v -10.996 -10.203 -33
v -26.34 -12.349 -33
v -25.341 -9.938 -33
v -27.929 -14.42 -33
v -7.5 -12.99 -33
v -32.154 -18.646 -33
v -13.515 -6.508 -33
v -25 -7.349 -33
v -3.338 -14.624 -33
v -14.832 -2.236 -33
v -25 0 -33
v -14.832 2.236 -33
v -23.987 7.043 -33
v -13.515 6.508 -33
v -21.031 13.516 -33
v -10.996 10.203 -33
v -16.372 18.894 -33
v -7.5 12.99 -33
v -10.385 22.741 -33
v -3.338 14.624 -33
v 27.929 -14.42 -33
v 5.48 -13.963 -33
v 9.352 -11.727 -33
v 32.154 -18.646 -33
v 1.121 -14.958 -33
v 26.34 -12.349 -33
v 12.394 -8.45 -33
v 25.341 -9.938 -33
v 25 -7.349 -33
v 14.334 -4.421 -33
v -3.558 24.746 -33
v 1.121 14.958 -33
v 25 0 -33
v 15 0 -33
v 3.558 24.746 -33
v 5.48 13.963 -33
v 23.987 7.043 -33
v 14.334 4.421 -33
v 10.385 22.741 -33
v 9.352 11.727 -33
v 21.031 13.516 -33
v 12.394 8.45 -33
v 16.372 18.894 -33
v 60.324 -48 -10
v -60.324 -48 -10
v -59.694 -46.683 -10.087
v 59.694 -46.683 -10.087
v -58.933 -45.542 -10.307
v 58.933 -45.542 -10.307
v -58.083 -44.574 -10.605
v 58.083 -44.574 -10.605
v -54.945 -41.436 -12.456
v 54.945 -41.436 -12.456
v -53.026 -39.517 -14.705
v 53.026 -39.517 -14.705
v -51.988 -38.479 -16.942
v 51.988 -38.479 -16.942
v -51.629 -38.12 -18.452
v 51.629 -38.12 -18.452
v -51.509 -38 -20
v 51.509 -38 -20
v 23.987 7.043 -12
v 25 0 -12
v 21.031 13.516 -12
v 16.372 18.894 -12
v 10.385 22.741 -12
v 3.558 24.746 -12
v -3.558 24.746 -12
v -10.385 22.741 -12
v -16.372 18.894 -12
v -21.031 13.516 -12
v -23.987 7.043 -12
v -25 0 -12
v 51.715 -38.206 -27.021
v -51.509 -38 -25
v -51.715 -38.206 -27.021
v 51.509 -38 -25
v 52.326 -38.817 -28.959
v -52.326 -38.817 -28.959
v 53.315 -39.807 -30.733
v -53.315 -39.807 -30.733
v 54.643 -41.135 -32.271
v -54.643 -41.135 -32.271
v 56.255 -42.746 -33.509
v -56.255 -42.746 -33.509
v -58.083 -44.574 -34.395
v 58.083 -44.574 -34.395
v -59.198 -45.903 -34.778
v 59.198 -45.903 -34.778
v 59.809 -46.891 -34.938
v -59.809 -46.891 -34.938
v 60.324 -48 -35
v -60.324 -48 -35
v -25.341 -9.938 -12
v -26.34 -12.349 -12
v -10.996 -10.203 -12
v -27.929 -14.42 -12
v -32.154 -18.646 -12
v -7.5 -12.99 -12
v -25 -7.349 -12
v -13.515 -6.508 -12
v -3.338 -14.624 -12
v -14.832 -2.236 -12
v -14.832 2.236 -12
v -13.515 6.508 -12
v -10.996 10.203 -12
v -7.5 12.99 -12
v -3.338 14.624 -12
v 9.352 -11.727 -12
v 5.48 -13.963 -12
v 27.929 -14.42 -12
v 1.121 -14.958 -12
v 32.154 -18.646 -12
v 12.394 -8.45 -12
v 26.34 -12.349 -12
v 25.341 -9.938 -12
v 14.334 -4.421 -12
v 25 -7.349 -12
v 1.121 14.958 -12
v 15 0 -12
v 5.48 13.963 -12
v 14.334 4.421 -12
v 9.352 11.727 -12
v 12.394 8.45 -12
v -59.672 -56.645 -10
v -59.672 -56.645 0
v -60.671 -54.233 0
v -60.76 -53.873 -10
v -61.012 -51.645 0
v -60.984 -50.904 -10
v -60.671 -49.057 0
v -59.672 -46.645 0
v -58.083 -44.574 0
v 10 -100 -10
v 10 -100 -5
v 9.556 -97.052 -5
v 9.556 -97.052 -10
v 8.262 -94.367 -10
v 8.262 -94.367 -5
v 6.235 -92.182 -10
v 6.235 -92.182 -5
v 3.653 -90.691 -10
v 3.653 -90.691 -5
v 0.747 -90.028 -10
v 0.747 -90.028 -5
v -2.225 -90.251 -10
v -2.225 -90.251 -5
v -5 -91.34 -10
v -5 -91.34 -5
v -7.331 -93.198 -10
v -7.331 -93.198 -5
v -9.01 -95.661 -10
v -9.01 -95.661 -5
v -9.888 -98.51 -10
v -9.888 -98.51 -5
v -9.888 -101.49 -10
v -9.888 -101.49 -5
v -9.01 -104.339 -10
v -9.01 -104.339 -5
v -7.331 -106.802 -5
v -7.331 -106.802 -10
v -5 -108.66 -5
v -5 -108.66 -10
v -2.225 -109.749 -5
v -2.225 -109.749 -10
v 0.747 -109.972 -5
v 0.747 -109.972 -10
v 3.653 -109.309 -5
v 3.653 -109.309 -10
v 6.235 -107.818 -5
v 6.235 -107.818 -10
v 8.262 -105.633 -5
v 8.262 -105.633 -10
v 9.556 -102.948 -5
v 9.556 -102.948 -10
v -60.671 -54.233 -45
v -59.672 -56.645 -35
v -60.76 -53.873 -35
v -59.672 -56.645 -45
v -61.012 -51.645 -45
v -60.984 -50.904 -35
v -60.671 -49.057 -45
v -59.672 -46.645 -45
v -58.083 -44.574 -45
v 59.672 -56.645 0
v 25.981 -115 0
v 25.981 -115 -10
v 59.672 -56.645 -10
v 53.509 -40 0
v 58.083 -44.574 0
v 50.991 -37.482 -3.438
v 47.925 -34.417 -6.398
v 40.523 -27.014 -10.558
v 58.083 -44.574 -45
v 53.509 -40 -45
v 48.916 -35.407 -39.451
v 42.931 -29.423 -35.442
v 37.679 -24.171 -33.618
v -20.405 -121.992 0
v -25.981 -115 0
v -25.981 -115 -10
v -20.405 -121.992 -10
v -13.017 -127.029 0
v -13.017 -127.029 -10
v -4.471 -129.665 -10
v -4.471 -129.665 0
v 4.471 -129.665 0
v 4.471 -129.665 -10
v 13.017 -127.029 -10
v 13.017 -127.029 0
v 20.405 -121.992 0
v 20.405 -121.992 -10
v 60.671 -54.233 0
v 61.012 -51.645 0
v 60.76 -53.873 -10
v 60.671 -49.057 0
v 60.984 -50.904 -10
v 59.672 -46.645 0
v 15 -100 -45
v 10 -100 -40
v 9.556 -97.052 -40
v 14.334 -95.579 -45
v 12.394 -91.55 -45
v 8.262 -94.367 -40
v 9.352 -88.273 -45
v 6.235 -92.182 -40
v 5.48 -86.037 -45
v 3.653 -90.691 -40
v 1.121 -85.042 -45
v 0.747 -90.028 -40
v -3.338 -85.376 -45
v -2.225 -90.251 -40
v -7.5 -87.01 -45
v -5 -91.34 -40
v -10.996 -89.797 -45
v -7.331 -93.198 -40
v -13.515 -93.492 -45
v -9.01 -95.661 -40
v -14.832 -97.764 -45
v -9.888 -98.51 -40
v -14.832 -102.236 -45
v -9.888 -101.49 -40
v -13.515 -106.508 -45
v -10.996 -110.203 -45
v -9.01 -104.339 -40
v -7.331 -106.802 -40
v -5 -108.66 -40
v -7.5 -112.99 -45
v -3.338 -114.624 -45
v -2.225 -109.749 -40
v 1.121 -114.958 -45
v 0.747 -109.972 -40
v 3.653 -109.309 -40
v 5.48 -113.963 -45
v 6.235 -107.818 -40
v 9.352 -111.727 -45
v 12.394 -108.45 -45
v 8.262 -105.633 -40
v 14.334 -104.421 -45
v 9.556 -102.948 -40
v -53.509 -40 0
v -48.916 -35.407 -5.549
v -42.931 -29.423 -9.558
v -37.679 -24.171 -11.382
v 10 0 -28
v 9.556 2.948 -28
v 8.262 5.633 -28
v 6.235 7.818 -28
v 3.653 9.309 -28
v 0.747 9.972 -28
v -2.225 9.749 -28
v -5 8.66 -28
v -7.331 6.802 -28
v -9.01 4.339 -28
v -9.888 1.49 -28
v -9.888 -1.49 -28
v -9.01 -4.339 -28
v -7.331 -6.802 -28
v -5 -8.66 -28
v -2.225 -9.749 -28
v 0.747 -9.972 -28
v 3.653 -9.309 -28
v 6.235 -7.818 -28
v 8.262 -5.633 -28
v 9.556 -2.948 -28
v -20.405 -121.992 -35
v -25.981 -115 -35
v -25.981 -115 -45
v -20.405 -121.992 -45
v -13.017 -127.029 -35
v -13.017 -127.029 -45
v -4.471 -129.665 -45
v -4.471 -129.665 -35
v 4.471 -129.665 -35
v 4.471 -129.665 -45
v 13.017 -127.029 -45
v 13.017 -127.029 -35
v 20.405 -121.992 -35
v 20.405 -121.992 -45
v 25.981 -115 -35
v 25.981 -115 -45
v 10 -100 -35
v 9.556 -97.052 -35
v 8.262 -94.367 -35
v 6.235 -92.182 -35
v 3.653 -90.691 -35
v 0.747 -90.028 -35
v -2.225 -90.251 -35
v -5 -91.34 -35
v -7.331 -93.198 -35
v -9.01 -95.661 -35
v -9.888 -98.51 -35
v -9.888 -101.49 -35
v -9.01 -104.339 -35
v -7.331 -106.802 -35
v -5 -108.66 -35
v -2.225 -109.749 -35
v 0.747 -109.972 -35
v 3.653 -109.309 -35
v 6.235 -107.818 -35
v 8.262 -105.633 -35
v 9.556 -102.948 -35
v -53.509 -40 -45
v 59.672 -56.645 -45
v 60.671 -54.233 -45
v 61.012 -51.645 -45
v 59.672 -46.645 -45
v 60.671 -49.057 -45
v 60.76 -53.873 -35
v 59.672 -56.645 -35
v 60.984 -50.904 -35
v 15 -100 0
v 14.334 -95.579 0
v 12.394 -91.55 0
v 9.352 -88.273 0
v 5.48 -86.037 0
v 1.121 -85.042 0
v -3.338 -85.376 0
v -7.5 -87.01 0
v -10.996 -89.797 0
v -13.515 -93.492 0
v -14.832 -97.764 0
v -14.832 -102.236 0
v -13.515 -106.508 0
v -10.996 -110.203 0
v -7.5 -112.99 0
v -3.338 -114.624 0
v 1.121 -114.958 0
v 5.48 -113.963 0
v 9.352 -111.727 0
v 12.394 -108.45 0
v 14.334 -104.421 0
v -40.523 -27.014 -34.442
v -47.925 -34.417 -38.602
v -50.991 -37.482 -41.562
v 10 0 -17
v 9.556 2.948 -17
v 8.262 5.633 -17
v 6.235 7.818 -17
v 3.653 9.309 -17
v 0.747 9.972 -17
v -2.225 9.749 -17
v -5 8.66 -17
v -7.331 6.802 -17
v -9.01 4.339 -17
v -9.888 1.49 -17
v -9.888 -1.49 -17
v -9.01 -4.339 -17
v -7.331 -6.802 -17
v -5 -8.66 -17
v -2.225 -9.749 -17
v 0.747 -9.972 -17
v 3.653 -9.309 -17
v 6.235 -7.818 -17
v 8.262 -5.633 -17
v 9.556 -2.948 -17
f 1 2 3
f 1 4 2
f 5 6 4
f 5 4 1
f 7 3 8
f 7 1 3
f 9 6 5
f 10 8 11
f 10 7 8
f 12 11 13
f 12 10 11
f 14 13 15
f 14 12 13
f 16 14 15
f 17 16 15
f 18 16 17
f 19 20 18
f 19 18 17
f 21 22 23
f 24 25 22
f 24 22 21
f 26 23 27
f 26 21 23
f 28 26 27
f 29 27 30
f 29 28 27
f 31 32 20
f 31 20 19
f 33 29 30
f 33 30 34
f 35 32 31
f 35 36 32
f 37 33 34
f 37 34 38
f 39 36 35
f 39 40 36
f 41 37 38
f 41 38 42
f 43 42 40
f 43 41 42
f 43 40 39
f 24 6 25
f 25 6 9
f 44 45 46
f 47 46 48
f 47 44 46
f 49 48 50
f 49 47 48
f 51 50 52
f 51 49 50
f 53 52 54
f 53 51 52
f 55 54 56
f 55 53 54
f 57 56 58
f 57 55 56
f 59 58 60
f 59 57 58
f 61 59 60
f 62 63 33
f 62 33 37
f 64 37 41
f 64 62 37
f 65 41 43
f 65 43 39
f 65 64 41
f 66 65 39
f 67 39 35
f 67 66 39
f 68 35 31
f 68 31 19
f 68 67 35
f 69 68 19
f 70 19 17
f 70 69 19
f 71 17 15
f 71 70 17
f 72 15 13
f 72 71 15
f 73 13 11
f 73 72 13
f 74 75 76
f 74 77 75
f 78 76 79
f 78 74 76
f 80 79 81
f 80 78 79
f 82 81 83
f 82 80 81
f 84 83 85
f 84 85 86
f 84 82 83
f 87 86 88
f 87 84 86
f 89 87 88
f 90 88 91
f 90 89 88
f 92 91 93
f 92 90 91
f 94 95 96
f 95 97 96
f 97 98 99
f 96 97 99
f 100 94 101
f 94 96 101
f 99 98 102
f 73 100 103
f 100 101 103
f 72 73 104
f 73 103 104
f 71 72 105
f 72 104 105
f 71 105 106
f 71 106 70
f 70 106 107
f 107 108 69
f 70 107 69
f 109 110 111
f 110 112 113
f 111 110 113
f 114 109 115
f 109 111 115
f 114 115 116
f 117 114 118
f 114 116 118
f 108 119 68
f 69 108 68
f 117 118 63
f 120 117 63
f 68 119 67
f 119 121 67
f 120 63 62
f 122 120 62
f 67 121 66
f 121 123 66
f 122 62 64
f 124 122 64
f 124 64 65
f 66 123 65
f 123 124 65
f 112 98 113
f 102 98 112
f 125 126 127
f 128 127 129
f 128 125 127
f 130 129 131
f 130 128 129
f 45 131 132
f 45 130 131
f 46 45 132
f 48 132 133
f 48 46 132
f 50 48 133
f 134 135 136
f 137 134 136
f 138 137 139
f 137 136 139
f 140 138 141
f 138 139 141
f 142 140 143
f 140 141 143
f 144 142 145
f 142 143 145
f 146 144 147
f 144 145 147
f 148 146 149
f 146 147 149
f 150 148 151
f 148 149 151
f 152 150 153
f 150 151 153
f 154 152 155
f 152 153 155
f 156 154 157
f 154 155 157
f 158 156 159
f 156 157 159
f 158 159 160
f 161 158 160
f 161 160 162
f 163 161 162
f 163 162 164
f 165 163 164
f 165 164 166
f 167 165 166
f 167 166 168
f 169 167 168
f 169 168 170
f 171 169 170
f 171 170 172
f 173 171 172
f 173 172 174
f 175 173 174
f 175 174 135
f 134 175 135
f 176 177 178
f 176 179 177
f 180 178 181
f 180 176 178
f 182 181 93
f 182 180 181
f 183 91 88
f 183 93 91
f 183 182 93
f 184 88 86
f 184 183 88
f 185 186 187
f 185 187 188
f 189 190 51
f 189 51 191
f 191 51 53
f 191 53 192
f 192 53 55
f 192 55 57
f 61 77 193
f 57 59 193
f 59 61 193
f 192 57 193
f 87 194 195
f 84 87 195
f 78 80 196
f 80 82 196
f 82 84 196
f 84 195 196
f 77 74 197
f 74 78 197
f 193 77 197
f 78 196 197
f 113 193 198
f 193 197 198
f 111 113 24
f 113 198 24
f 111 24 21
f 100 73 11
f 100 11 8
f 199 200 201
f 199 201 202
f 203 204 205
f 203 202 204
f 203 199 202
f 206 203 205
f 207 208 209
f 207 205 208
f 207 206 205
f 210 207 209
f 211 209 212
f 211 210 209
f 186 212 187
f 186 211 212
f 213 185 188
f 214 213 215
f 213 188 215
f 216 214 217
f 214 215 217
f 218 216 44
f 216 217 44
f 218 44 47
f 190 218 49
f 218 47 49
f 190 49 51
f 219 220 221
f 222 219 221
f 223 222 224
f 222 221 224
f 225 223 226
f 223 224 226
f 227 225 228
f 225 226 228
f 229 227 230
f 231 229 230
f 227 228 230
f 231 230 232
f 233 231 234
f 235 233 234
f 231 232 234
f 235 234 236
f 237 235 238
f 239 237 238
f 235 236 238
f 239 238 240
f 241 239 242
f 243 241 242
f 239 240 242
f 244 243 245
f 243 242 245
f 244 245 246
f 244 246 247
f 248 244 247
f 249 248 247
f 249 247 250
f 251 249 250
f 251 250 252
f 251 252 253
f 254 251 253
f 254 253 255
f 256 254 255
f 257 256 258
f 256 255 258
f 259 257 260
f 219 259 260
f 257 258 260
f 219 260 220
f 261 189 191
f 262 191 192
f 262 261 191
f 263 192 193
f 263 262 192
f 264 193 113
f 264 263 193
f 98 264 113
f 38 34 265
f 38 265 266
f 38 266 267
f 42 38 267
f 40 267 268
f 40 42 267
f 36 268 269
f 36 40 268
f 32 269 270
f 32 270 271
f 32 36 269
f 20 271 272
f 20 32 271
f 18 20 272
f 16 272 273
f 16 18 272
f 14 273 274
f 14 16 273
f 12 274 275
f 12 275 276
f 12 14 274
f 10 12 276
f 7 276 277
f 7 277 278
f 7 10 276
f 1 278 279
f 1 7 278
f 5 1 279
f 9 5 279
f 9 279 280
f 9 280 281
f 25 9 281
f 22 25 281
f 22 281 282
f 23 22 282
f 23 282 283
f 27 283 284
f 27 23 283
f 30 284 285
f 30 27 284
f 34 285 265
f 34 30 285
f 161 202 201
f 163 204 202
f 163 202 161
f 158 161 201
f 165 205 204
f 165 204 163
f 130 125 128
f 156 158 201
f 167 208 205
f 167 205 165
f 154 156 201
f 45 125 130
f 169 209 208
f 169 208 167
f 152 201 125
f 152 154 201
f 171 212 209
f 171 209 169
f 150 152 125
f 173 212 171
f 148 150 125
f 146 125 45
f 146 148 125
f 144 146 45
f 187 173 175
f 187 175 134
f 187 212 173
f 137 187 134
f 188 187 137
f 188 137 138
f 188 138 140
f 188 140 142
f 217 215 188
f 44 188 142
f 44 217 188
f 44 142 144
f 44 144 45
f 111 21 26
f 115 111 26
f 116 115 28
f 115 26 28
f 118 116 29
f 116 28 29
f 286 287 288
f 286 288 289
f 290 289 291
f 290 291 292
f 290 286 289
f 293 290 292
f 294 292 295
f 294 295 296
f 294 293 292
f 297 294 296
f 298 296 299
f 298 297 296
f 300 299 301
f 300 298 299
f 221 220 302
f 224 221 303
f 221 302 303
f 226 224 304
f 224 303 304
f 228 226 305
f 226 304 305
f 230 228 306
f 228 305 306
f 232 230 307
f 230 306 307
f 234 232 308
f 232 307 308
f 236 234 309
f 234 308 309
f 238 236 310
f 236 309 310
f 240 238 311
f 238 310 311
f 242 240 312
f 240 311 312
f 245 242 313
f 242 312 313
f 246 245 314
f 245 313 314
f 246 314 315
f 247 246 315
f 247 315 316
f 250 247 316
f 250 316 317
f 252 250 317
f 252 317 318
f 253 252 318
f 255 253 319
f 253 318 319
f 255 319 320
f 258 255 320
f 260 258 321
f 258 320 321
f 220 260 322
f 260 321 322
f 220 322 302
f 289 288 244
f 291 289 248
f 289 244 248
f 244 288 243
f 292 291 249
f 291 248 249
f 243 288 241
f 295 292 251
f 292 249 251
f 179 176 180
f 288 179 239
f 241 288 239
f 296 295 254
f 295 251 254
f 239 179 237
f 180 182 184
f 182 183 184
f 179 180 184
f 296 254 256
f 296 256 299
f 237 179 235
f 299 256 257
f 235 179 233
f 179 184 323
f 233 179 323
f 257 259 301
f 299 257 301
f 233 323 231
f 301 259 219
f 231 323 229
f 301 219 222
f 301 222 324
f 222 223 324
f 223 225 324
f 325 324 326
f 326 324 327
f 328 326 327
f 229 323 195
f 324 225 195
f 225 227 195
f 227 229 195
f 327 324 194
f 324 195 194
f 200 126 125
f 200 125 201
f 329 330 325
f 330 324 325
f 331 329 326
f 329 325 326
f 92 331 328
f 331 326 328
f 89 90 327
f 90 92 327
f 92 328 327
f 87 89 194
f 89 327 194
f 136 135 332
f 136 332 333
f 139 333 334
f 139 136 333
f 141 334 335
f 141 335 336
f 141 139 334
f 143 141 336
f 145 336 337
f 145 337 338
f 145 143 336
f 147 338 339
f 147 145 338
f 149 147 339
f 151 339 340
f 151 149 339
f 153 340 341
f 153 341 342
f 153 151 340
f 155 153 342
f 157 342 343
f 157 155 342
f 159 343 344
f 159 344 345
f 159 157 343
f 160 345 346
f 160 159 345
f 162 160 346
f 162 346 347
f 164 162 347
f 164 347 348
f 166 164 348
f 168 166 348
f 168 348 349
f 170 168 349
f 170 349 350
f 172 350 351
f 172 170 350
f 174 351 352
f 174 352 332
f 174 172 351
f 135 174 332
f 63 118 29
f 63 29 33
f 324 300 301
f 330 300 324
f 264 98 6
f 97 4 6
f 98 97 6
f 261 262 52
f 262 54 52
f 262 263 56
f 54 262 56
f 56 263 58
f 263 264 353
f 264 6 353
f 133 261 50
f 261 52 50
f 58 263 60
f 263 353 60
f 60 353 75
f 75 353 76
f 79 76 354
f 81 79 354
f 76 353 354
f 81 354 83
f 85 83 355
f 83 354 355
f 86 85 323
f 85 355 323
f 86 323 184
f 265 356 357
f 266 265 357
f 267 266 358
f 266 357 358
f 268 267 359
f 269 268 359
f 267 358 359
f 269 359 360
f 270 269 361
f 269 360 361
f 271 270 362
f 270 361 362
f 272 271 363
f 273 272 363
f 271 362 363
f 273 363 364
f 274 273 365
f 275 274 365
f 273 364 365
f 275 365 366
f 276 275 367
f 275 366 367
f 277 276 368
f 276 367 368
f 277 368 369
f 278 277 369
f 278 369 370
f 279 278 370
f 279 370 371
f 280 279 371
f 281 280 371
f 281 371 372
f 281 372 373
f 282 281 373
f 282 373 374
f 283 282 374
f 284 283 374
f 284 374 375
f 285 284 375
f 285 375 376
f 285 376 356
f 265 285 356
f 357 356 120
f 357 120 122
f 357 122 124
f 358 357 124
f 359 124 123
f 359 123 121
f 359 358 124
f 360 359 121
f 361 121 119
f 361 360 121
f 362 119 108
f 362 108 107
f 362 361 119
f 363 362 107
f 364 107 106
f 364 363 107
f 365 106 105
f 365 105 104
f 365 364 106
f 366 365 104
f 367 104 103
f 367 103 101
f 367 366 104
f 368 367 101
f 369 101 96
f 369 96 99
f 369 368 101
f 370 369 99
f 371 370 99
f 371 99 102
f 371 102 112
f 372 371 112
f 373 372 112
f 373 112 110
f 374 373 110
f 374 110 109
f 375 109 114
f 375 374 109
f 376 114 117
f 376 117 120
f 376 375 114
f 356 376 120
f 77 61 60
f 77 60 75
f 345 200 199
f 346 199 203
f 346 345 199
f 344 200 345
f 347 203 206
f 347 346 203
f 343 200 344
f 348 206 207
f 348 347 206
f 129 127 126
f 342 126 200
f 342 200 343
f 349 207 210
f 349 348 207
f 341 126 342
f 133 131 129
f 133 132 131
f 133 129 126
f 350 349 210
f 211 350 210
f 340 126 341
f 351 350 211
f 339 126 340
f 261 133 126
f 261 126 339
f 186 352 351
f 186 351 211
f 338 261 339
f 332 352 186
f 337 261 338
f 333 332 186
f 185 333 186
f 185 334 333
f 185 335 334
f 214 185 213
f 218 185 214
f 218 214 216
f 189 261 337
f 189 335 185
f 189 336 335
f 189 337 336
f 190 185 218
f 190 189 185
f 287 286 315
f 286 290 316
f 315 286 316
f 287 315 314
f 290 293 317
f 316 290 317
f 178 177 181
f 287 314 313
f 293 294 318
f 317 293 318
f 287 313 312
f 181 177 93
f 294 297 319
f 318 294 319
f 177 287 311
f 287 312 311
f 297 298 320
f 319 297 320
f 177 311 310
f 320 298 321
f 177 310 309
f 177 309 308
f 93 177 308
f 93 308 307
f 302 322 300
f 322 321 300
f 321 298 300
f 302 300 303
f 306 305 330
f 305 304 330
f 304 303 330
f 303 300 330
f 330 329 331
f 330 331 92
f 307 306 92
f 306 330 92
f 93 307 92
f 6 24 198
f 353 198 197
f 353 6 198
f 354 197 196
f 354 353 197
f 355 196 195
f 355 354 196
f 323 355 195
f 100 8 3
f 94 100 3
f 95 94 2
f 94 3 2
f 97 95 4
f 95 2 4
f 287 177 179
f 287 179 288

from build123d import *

# Parameters (mm, degrees)
SKETCH1_R                      = 10
BOSS_EXTRUDE1_DEPTH            = 45
CUT_EXTRUDE1_REACH             = 153.52
SKETCH2_W                      = 25
SKETCH2_H                      = 92
CUT_EXTRUDE1_DIRECTION_2_REACH = 153.52
FILLET2_R                      = 10
FILLET3_R                      = 10
CUT_EXTRUDE5_REACH             = 164.244
SKETCH4_W                      = 12
SKETCH4_H                      = 65
CUT_EXTRUDE5_DIRECTION_2_REACH = 164.244
FILLET4_R                      = 25
CHAMFER1_SIZE                  = 5


with BuildPart() as part:
    # Sketch1 → Boss-Extrude1 (new body)
    with BuildSketch(Plane.XY):
        with BuildLine():
            Line((-25, 0), (-25, -11.491470389))
            Line((-25, -11.491470389), (-63.508529611, -50))
            Line((-63.508529611, -50), (-25.980762114, -115))
            ThreePointArc((-25.980762114, -115), (0, -130), (25.980762114, -115))
            Line((25.980762114, -115), (63.508529611, -50))
            Line((63.508529611, -50), (25, -11.491470389))
            Line((25, -11.491470389), (25, 0))
            ThreePointArc((25, 0), (0, 25), (-25, 0))
        make_face()
        Circle(SKETCH1_R, mode=Mode.SUBTRACT)
        with Locations((0, -100)):
            Circle(SKETCH1_R, mode=Mode.SUBTRACT)
    extrude(amount=-BOSS_EXTRUDE1_DEPTH)

    # Sketch2 → Cut-Extrude1 (cut, up to next)
    with BuildSketch(Plane(origin=(0, 0, 0), x_dir=(0, 0, -1), z_dir=(1, 0, 0)), mode=Mode.PRIVATE) as cut_extrude1_sk1:
        with Locations((22.5, -84)):
            Rectangle(SKETCH2_W, SKETCH2_H)
    cut_extrude1_tool1 = extrude(cut_extrude1_sk1.sketch, amount=-CUT_EXTRUDE1_REACH, mode=Mode.PRIVATE) & part.part
    add(cut_extrude1_tool1.solids().sort_by_distance((0, -84, -22.5))[0], mode=Mode.SUBTRACT)

    # Sketch2 → Cut-Extrude1 direction 2 (cut, up to next)
    with BuildSketch(Plane(origin=(0, 0, 0), x_dir=(0, 0, -1), z_dir=(1, 0, 0)), mode=Mode.PRIVATE) as cut_extrude1_direction_2_sk1:
        with Locations((22.5, -84)):
            Rectangle(SKETCH2_W, SKETCH2_H)
    cut_extrude1_direction_2_tool1 = extrude(cut_extrude1_direction_2_sk1.sketch, amount=CUT_EXTRUDE1_DIRECTION_2_REACH, mode=Mode.PRIVATE) & part.part
    add(cut_extrude1_direction_2_tool1.solids().sort_by_distance((0, -84, -22.5))[0], mode=Mode.SUBTRACT)

    # Fillet2
    fillet2_edges = [part.edges().sort_by_distance(p)[0] for p in [
        (25, -11.491470389, -22.5),
        (63.508529611, -50, -40),
        (-63.508529611, -50, -40),
        (-25, -11.491470389, -22.5),
        (-63.508529611, -50, -5),
        (63.508529611, -50, -5),
    ]]
    fillet(fillet2_edges, radius=FILLET2_R)

    # Fillet3
    fillet3_edges = [part.edges().sort_by_distance(p)[0] for p in [
        (0, -38, -10),
        (0, -38, -35),
    ]]
    fillet(fillet3_edges, radius=FILLET3_R)

    # Sketch4 → Cut-Extrude5 (cut, up to next)
    with BuildSketch(Plane(origin=(25, 0, 0), x_dir=(0, 0, -1), z_dir=(1, 0, 0)), mode=Mode.PRIVATE) as cut_extrude5_sk1:
        with Locations((39, -7.5)):
            Rectangle(SKETCH4_W, SKETCH4_H)
    cut_extrude5_tool1 = extrude(cut_extrude5_sk1.sketch, amount=-CUT_EXTRUDE5_REACH, mode=Mode.PRIVATE) & part.part
    # Sketch4 → Cut-Extrude5 (cut, up to next)
    with BuildSketch(Plane(origin=(25, 0, 0), x_dir=(0, 0, -1), z_dir=(1, 0, 0)), mode=Mode.PRIVATE) as cut_extrude5_sk2:
        with Locations((6, -7.5)):
            Rectangle(SKETCH4_W, SKETCH4_H)
    cut_extrude5_tool2 = extrude(cut_extrude5_sk2.sketch, amount=-CUT_EXTRUDE5_REACH, mode=Mode.PRIVATE) & part.part
    add(cut_extrude5_tool1.solids().sort_by_distance((25, -7.5, -39))[0], mode=Mode.SUBTRACT)
    add(cut_extrude5_tool2.solids().sort_by_distance((25, -7.5, -6))[0], mode=Mode.SUBTRACT)

    # Sketch4 → Cut-Extrude5 direction 2 (cut, up to next)
    with BuildSketch(Plane(origin=(25, 0, 0), x_dir=(0, 0, -1), z_dir=(1, 0, 0)), mode=Mode.PRIVATE) as cut_extrude5_direction_2_sk1:
        with Locations((39, -7.5)):
            Rectangle(SKETCH4_W, SKETCH4_H)
    cut_extrude5_direction_2_tool1 = extrude(cut_extrude5_direction_2_sk1.sketch, amount=CUT_EXTRUDE5_DIRECTION_2_REACH, mode=Mode.PRIVATE) & part.part
    # Sketch4 → Cut-Extrude5 direction 2 (cut, up to next)
    with BuildSketch(Plane(origin=(25, 0, 0), x_dir=(0, 0, -1), z_dir=(1, 0, 0)), mode=Mode.PRIVATE) as cut_extrude5_direction_2_sk2:
        with Locations((6, -7.5)):
            Rectangle(SKETCH4_W, SKETCH4_H)
    cut_extrude5_direction_2_tool2 = extrude(cut_extrude5_direction_2_sk2.sketch, amount=CUT_EXTRUDE5_DIRECTION_2_REACH, mode=Mode.PRIVATE) & part.part
    add(cut_extrude5_direction_2_tool1.solids().sort_by_distance((25, -7.5, -39))[0], mode=Mode.SUBTRACT)
    add(cut_extrude5_direction_2_tool2.solids().sort_by_distance((25, -7.5, -6))[0], mode=Mode.SUBTRACT)

    # Fillet4
    # the kernel refuses this fillet: 25 mm, written as the material it adds along each edge
    with BuildSketch(Plane(origin=(-106.893920871, -40, -33), x_dir=(0, 1, 0), z_dir=(1, 0, 0))) as fillet4_piece_1_section:
        with BuildLine():
            CenterArc((21.354156504, -25), FILLET4_R, 90, 58.667748502)
            Line((0, -12), (-0.42708313, -11.74))
            ThreePointArc((-0.42708313, -11.74), (-0.5, -6), (-0.5, 0))
            Line((-0.5, 0), (0, 0.5))
            Line((0, 0.5), (21.354156504, 0.5))
            Line((21.354156504, 0.5), (21.354156504, 0))
        make_face()
    fillet4_piece_1 = extrude(amount=213.787841742, mode=Mode.PRIVATE)
    fillet4_piece_1 = split(fillet4_piece_1, bisect_by=Plane(origin=(-24.314247143, -10.805717532, -36.275046533), z_dir=(0.7071067811865465, -0.7071067811865487, 0)), keep=Keep.TOP, mode=Mode.PRIVATE)
    fillet4_piece_1 = split(fillet4_piece_1, bisect_by=Plane(origin=(24.314247143, -10.805717532, -36.275046533), z_dir=(-0.7071067811865465, -0.7071067811865487, 0)), keep=Keep.TOP, mode=Mode.PRIVATE)
    add(fillet4_piece_1)
    with BuildSketch(Plane(origin=(-106.893920871, -40, -12), x_dir=(0, 0, 1), z_dir=(1, 0, 0))) as fillet4_piece_2_section:
        with BuildLine():
            CenterArc((25, -21.354156504), FILLET4_R, 121.332251498, 58.667748502)
            Line((0, -21.354156504), (-0.5, -21.354156504))
            Line((-0.5, -21.354156504), (-0.5, 0))
            Line((-0.5, 0), (0, 0.5))
            ThreePointArc((0, 0.5), (6, 0.5), (11.74, 0.42708313))
            Line((11.74, 0.42708313), (12, 0))
        make_face()
    fillet4_piece_2 = extrude(amount=213.787841742, mode=Mode.PRIVATE)
    fillet4_piece_2 = split(fillet4_piece_2, bisect_by=Plane(origin=(-24.314247143, -10.805717532, -8.724953467), z_dir=(0.7071067811865465, -0.7071067811865487, 0)), keep=Keep.TOP, mode=Mode.PRIVATE)
    fillet4_piece_2 = split(fillet4_piece_2, bisect_by=Plane(origin=(24.314247143, -10.805717532, -8.724953467), z_dir=(-0.7071067811865465, -0.7071067811865487, 0)), keep=Keep.TOP, mode=Mode.PRIVATE)
    add(fillet4_piece_2)

    # Chamfer1
    chamfer1_edges = [part.edges().sort_by_distance(p)[0] for p in [
        (-10, 0, -12),
        (-10, 0, -33),
        (-10, -100, -45),
        (-10, -100, 0),
    ]]
    chamfer(chamfer1_edges, length=CHAMFER1_SIZE)


solid = part.part
